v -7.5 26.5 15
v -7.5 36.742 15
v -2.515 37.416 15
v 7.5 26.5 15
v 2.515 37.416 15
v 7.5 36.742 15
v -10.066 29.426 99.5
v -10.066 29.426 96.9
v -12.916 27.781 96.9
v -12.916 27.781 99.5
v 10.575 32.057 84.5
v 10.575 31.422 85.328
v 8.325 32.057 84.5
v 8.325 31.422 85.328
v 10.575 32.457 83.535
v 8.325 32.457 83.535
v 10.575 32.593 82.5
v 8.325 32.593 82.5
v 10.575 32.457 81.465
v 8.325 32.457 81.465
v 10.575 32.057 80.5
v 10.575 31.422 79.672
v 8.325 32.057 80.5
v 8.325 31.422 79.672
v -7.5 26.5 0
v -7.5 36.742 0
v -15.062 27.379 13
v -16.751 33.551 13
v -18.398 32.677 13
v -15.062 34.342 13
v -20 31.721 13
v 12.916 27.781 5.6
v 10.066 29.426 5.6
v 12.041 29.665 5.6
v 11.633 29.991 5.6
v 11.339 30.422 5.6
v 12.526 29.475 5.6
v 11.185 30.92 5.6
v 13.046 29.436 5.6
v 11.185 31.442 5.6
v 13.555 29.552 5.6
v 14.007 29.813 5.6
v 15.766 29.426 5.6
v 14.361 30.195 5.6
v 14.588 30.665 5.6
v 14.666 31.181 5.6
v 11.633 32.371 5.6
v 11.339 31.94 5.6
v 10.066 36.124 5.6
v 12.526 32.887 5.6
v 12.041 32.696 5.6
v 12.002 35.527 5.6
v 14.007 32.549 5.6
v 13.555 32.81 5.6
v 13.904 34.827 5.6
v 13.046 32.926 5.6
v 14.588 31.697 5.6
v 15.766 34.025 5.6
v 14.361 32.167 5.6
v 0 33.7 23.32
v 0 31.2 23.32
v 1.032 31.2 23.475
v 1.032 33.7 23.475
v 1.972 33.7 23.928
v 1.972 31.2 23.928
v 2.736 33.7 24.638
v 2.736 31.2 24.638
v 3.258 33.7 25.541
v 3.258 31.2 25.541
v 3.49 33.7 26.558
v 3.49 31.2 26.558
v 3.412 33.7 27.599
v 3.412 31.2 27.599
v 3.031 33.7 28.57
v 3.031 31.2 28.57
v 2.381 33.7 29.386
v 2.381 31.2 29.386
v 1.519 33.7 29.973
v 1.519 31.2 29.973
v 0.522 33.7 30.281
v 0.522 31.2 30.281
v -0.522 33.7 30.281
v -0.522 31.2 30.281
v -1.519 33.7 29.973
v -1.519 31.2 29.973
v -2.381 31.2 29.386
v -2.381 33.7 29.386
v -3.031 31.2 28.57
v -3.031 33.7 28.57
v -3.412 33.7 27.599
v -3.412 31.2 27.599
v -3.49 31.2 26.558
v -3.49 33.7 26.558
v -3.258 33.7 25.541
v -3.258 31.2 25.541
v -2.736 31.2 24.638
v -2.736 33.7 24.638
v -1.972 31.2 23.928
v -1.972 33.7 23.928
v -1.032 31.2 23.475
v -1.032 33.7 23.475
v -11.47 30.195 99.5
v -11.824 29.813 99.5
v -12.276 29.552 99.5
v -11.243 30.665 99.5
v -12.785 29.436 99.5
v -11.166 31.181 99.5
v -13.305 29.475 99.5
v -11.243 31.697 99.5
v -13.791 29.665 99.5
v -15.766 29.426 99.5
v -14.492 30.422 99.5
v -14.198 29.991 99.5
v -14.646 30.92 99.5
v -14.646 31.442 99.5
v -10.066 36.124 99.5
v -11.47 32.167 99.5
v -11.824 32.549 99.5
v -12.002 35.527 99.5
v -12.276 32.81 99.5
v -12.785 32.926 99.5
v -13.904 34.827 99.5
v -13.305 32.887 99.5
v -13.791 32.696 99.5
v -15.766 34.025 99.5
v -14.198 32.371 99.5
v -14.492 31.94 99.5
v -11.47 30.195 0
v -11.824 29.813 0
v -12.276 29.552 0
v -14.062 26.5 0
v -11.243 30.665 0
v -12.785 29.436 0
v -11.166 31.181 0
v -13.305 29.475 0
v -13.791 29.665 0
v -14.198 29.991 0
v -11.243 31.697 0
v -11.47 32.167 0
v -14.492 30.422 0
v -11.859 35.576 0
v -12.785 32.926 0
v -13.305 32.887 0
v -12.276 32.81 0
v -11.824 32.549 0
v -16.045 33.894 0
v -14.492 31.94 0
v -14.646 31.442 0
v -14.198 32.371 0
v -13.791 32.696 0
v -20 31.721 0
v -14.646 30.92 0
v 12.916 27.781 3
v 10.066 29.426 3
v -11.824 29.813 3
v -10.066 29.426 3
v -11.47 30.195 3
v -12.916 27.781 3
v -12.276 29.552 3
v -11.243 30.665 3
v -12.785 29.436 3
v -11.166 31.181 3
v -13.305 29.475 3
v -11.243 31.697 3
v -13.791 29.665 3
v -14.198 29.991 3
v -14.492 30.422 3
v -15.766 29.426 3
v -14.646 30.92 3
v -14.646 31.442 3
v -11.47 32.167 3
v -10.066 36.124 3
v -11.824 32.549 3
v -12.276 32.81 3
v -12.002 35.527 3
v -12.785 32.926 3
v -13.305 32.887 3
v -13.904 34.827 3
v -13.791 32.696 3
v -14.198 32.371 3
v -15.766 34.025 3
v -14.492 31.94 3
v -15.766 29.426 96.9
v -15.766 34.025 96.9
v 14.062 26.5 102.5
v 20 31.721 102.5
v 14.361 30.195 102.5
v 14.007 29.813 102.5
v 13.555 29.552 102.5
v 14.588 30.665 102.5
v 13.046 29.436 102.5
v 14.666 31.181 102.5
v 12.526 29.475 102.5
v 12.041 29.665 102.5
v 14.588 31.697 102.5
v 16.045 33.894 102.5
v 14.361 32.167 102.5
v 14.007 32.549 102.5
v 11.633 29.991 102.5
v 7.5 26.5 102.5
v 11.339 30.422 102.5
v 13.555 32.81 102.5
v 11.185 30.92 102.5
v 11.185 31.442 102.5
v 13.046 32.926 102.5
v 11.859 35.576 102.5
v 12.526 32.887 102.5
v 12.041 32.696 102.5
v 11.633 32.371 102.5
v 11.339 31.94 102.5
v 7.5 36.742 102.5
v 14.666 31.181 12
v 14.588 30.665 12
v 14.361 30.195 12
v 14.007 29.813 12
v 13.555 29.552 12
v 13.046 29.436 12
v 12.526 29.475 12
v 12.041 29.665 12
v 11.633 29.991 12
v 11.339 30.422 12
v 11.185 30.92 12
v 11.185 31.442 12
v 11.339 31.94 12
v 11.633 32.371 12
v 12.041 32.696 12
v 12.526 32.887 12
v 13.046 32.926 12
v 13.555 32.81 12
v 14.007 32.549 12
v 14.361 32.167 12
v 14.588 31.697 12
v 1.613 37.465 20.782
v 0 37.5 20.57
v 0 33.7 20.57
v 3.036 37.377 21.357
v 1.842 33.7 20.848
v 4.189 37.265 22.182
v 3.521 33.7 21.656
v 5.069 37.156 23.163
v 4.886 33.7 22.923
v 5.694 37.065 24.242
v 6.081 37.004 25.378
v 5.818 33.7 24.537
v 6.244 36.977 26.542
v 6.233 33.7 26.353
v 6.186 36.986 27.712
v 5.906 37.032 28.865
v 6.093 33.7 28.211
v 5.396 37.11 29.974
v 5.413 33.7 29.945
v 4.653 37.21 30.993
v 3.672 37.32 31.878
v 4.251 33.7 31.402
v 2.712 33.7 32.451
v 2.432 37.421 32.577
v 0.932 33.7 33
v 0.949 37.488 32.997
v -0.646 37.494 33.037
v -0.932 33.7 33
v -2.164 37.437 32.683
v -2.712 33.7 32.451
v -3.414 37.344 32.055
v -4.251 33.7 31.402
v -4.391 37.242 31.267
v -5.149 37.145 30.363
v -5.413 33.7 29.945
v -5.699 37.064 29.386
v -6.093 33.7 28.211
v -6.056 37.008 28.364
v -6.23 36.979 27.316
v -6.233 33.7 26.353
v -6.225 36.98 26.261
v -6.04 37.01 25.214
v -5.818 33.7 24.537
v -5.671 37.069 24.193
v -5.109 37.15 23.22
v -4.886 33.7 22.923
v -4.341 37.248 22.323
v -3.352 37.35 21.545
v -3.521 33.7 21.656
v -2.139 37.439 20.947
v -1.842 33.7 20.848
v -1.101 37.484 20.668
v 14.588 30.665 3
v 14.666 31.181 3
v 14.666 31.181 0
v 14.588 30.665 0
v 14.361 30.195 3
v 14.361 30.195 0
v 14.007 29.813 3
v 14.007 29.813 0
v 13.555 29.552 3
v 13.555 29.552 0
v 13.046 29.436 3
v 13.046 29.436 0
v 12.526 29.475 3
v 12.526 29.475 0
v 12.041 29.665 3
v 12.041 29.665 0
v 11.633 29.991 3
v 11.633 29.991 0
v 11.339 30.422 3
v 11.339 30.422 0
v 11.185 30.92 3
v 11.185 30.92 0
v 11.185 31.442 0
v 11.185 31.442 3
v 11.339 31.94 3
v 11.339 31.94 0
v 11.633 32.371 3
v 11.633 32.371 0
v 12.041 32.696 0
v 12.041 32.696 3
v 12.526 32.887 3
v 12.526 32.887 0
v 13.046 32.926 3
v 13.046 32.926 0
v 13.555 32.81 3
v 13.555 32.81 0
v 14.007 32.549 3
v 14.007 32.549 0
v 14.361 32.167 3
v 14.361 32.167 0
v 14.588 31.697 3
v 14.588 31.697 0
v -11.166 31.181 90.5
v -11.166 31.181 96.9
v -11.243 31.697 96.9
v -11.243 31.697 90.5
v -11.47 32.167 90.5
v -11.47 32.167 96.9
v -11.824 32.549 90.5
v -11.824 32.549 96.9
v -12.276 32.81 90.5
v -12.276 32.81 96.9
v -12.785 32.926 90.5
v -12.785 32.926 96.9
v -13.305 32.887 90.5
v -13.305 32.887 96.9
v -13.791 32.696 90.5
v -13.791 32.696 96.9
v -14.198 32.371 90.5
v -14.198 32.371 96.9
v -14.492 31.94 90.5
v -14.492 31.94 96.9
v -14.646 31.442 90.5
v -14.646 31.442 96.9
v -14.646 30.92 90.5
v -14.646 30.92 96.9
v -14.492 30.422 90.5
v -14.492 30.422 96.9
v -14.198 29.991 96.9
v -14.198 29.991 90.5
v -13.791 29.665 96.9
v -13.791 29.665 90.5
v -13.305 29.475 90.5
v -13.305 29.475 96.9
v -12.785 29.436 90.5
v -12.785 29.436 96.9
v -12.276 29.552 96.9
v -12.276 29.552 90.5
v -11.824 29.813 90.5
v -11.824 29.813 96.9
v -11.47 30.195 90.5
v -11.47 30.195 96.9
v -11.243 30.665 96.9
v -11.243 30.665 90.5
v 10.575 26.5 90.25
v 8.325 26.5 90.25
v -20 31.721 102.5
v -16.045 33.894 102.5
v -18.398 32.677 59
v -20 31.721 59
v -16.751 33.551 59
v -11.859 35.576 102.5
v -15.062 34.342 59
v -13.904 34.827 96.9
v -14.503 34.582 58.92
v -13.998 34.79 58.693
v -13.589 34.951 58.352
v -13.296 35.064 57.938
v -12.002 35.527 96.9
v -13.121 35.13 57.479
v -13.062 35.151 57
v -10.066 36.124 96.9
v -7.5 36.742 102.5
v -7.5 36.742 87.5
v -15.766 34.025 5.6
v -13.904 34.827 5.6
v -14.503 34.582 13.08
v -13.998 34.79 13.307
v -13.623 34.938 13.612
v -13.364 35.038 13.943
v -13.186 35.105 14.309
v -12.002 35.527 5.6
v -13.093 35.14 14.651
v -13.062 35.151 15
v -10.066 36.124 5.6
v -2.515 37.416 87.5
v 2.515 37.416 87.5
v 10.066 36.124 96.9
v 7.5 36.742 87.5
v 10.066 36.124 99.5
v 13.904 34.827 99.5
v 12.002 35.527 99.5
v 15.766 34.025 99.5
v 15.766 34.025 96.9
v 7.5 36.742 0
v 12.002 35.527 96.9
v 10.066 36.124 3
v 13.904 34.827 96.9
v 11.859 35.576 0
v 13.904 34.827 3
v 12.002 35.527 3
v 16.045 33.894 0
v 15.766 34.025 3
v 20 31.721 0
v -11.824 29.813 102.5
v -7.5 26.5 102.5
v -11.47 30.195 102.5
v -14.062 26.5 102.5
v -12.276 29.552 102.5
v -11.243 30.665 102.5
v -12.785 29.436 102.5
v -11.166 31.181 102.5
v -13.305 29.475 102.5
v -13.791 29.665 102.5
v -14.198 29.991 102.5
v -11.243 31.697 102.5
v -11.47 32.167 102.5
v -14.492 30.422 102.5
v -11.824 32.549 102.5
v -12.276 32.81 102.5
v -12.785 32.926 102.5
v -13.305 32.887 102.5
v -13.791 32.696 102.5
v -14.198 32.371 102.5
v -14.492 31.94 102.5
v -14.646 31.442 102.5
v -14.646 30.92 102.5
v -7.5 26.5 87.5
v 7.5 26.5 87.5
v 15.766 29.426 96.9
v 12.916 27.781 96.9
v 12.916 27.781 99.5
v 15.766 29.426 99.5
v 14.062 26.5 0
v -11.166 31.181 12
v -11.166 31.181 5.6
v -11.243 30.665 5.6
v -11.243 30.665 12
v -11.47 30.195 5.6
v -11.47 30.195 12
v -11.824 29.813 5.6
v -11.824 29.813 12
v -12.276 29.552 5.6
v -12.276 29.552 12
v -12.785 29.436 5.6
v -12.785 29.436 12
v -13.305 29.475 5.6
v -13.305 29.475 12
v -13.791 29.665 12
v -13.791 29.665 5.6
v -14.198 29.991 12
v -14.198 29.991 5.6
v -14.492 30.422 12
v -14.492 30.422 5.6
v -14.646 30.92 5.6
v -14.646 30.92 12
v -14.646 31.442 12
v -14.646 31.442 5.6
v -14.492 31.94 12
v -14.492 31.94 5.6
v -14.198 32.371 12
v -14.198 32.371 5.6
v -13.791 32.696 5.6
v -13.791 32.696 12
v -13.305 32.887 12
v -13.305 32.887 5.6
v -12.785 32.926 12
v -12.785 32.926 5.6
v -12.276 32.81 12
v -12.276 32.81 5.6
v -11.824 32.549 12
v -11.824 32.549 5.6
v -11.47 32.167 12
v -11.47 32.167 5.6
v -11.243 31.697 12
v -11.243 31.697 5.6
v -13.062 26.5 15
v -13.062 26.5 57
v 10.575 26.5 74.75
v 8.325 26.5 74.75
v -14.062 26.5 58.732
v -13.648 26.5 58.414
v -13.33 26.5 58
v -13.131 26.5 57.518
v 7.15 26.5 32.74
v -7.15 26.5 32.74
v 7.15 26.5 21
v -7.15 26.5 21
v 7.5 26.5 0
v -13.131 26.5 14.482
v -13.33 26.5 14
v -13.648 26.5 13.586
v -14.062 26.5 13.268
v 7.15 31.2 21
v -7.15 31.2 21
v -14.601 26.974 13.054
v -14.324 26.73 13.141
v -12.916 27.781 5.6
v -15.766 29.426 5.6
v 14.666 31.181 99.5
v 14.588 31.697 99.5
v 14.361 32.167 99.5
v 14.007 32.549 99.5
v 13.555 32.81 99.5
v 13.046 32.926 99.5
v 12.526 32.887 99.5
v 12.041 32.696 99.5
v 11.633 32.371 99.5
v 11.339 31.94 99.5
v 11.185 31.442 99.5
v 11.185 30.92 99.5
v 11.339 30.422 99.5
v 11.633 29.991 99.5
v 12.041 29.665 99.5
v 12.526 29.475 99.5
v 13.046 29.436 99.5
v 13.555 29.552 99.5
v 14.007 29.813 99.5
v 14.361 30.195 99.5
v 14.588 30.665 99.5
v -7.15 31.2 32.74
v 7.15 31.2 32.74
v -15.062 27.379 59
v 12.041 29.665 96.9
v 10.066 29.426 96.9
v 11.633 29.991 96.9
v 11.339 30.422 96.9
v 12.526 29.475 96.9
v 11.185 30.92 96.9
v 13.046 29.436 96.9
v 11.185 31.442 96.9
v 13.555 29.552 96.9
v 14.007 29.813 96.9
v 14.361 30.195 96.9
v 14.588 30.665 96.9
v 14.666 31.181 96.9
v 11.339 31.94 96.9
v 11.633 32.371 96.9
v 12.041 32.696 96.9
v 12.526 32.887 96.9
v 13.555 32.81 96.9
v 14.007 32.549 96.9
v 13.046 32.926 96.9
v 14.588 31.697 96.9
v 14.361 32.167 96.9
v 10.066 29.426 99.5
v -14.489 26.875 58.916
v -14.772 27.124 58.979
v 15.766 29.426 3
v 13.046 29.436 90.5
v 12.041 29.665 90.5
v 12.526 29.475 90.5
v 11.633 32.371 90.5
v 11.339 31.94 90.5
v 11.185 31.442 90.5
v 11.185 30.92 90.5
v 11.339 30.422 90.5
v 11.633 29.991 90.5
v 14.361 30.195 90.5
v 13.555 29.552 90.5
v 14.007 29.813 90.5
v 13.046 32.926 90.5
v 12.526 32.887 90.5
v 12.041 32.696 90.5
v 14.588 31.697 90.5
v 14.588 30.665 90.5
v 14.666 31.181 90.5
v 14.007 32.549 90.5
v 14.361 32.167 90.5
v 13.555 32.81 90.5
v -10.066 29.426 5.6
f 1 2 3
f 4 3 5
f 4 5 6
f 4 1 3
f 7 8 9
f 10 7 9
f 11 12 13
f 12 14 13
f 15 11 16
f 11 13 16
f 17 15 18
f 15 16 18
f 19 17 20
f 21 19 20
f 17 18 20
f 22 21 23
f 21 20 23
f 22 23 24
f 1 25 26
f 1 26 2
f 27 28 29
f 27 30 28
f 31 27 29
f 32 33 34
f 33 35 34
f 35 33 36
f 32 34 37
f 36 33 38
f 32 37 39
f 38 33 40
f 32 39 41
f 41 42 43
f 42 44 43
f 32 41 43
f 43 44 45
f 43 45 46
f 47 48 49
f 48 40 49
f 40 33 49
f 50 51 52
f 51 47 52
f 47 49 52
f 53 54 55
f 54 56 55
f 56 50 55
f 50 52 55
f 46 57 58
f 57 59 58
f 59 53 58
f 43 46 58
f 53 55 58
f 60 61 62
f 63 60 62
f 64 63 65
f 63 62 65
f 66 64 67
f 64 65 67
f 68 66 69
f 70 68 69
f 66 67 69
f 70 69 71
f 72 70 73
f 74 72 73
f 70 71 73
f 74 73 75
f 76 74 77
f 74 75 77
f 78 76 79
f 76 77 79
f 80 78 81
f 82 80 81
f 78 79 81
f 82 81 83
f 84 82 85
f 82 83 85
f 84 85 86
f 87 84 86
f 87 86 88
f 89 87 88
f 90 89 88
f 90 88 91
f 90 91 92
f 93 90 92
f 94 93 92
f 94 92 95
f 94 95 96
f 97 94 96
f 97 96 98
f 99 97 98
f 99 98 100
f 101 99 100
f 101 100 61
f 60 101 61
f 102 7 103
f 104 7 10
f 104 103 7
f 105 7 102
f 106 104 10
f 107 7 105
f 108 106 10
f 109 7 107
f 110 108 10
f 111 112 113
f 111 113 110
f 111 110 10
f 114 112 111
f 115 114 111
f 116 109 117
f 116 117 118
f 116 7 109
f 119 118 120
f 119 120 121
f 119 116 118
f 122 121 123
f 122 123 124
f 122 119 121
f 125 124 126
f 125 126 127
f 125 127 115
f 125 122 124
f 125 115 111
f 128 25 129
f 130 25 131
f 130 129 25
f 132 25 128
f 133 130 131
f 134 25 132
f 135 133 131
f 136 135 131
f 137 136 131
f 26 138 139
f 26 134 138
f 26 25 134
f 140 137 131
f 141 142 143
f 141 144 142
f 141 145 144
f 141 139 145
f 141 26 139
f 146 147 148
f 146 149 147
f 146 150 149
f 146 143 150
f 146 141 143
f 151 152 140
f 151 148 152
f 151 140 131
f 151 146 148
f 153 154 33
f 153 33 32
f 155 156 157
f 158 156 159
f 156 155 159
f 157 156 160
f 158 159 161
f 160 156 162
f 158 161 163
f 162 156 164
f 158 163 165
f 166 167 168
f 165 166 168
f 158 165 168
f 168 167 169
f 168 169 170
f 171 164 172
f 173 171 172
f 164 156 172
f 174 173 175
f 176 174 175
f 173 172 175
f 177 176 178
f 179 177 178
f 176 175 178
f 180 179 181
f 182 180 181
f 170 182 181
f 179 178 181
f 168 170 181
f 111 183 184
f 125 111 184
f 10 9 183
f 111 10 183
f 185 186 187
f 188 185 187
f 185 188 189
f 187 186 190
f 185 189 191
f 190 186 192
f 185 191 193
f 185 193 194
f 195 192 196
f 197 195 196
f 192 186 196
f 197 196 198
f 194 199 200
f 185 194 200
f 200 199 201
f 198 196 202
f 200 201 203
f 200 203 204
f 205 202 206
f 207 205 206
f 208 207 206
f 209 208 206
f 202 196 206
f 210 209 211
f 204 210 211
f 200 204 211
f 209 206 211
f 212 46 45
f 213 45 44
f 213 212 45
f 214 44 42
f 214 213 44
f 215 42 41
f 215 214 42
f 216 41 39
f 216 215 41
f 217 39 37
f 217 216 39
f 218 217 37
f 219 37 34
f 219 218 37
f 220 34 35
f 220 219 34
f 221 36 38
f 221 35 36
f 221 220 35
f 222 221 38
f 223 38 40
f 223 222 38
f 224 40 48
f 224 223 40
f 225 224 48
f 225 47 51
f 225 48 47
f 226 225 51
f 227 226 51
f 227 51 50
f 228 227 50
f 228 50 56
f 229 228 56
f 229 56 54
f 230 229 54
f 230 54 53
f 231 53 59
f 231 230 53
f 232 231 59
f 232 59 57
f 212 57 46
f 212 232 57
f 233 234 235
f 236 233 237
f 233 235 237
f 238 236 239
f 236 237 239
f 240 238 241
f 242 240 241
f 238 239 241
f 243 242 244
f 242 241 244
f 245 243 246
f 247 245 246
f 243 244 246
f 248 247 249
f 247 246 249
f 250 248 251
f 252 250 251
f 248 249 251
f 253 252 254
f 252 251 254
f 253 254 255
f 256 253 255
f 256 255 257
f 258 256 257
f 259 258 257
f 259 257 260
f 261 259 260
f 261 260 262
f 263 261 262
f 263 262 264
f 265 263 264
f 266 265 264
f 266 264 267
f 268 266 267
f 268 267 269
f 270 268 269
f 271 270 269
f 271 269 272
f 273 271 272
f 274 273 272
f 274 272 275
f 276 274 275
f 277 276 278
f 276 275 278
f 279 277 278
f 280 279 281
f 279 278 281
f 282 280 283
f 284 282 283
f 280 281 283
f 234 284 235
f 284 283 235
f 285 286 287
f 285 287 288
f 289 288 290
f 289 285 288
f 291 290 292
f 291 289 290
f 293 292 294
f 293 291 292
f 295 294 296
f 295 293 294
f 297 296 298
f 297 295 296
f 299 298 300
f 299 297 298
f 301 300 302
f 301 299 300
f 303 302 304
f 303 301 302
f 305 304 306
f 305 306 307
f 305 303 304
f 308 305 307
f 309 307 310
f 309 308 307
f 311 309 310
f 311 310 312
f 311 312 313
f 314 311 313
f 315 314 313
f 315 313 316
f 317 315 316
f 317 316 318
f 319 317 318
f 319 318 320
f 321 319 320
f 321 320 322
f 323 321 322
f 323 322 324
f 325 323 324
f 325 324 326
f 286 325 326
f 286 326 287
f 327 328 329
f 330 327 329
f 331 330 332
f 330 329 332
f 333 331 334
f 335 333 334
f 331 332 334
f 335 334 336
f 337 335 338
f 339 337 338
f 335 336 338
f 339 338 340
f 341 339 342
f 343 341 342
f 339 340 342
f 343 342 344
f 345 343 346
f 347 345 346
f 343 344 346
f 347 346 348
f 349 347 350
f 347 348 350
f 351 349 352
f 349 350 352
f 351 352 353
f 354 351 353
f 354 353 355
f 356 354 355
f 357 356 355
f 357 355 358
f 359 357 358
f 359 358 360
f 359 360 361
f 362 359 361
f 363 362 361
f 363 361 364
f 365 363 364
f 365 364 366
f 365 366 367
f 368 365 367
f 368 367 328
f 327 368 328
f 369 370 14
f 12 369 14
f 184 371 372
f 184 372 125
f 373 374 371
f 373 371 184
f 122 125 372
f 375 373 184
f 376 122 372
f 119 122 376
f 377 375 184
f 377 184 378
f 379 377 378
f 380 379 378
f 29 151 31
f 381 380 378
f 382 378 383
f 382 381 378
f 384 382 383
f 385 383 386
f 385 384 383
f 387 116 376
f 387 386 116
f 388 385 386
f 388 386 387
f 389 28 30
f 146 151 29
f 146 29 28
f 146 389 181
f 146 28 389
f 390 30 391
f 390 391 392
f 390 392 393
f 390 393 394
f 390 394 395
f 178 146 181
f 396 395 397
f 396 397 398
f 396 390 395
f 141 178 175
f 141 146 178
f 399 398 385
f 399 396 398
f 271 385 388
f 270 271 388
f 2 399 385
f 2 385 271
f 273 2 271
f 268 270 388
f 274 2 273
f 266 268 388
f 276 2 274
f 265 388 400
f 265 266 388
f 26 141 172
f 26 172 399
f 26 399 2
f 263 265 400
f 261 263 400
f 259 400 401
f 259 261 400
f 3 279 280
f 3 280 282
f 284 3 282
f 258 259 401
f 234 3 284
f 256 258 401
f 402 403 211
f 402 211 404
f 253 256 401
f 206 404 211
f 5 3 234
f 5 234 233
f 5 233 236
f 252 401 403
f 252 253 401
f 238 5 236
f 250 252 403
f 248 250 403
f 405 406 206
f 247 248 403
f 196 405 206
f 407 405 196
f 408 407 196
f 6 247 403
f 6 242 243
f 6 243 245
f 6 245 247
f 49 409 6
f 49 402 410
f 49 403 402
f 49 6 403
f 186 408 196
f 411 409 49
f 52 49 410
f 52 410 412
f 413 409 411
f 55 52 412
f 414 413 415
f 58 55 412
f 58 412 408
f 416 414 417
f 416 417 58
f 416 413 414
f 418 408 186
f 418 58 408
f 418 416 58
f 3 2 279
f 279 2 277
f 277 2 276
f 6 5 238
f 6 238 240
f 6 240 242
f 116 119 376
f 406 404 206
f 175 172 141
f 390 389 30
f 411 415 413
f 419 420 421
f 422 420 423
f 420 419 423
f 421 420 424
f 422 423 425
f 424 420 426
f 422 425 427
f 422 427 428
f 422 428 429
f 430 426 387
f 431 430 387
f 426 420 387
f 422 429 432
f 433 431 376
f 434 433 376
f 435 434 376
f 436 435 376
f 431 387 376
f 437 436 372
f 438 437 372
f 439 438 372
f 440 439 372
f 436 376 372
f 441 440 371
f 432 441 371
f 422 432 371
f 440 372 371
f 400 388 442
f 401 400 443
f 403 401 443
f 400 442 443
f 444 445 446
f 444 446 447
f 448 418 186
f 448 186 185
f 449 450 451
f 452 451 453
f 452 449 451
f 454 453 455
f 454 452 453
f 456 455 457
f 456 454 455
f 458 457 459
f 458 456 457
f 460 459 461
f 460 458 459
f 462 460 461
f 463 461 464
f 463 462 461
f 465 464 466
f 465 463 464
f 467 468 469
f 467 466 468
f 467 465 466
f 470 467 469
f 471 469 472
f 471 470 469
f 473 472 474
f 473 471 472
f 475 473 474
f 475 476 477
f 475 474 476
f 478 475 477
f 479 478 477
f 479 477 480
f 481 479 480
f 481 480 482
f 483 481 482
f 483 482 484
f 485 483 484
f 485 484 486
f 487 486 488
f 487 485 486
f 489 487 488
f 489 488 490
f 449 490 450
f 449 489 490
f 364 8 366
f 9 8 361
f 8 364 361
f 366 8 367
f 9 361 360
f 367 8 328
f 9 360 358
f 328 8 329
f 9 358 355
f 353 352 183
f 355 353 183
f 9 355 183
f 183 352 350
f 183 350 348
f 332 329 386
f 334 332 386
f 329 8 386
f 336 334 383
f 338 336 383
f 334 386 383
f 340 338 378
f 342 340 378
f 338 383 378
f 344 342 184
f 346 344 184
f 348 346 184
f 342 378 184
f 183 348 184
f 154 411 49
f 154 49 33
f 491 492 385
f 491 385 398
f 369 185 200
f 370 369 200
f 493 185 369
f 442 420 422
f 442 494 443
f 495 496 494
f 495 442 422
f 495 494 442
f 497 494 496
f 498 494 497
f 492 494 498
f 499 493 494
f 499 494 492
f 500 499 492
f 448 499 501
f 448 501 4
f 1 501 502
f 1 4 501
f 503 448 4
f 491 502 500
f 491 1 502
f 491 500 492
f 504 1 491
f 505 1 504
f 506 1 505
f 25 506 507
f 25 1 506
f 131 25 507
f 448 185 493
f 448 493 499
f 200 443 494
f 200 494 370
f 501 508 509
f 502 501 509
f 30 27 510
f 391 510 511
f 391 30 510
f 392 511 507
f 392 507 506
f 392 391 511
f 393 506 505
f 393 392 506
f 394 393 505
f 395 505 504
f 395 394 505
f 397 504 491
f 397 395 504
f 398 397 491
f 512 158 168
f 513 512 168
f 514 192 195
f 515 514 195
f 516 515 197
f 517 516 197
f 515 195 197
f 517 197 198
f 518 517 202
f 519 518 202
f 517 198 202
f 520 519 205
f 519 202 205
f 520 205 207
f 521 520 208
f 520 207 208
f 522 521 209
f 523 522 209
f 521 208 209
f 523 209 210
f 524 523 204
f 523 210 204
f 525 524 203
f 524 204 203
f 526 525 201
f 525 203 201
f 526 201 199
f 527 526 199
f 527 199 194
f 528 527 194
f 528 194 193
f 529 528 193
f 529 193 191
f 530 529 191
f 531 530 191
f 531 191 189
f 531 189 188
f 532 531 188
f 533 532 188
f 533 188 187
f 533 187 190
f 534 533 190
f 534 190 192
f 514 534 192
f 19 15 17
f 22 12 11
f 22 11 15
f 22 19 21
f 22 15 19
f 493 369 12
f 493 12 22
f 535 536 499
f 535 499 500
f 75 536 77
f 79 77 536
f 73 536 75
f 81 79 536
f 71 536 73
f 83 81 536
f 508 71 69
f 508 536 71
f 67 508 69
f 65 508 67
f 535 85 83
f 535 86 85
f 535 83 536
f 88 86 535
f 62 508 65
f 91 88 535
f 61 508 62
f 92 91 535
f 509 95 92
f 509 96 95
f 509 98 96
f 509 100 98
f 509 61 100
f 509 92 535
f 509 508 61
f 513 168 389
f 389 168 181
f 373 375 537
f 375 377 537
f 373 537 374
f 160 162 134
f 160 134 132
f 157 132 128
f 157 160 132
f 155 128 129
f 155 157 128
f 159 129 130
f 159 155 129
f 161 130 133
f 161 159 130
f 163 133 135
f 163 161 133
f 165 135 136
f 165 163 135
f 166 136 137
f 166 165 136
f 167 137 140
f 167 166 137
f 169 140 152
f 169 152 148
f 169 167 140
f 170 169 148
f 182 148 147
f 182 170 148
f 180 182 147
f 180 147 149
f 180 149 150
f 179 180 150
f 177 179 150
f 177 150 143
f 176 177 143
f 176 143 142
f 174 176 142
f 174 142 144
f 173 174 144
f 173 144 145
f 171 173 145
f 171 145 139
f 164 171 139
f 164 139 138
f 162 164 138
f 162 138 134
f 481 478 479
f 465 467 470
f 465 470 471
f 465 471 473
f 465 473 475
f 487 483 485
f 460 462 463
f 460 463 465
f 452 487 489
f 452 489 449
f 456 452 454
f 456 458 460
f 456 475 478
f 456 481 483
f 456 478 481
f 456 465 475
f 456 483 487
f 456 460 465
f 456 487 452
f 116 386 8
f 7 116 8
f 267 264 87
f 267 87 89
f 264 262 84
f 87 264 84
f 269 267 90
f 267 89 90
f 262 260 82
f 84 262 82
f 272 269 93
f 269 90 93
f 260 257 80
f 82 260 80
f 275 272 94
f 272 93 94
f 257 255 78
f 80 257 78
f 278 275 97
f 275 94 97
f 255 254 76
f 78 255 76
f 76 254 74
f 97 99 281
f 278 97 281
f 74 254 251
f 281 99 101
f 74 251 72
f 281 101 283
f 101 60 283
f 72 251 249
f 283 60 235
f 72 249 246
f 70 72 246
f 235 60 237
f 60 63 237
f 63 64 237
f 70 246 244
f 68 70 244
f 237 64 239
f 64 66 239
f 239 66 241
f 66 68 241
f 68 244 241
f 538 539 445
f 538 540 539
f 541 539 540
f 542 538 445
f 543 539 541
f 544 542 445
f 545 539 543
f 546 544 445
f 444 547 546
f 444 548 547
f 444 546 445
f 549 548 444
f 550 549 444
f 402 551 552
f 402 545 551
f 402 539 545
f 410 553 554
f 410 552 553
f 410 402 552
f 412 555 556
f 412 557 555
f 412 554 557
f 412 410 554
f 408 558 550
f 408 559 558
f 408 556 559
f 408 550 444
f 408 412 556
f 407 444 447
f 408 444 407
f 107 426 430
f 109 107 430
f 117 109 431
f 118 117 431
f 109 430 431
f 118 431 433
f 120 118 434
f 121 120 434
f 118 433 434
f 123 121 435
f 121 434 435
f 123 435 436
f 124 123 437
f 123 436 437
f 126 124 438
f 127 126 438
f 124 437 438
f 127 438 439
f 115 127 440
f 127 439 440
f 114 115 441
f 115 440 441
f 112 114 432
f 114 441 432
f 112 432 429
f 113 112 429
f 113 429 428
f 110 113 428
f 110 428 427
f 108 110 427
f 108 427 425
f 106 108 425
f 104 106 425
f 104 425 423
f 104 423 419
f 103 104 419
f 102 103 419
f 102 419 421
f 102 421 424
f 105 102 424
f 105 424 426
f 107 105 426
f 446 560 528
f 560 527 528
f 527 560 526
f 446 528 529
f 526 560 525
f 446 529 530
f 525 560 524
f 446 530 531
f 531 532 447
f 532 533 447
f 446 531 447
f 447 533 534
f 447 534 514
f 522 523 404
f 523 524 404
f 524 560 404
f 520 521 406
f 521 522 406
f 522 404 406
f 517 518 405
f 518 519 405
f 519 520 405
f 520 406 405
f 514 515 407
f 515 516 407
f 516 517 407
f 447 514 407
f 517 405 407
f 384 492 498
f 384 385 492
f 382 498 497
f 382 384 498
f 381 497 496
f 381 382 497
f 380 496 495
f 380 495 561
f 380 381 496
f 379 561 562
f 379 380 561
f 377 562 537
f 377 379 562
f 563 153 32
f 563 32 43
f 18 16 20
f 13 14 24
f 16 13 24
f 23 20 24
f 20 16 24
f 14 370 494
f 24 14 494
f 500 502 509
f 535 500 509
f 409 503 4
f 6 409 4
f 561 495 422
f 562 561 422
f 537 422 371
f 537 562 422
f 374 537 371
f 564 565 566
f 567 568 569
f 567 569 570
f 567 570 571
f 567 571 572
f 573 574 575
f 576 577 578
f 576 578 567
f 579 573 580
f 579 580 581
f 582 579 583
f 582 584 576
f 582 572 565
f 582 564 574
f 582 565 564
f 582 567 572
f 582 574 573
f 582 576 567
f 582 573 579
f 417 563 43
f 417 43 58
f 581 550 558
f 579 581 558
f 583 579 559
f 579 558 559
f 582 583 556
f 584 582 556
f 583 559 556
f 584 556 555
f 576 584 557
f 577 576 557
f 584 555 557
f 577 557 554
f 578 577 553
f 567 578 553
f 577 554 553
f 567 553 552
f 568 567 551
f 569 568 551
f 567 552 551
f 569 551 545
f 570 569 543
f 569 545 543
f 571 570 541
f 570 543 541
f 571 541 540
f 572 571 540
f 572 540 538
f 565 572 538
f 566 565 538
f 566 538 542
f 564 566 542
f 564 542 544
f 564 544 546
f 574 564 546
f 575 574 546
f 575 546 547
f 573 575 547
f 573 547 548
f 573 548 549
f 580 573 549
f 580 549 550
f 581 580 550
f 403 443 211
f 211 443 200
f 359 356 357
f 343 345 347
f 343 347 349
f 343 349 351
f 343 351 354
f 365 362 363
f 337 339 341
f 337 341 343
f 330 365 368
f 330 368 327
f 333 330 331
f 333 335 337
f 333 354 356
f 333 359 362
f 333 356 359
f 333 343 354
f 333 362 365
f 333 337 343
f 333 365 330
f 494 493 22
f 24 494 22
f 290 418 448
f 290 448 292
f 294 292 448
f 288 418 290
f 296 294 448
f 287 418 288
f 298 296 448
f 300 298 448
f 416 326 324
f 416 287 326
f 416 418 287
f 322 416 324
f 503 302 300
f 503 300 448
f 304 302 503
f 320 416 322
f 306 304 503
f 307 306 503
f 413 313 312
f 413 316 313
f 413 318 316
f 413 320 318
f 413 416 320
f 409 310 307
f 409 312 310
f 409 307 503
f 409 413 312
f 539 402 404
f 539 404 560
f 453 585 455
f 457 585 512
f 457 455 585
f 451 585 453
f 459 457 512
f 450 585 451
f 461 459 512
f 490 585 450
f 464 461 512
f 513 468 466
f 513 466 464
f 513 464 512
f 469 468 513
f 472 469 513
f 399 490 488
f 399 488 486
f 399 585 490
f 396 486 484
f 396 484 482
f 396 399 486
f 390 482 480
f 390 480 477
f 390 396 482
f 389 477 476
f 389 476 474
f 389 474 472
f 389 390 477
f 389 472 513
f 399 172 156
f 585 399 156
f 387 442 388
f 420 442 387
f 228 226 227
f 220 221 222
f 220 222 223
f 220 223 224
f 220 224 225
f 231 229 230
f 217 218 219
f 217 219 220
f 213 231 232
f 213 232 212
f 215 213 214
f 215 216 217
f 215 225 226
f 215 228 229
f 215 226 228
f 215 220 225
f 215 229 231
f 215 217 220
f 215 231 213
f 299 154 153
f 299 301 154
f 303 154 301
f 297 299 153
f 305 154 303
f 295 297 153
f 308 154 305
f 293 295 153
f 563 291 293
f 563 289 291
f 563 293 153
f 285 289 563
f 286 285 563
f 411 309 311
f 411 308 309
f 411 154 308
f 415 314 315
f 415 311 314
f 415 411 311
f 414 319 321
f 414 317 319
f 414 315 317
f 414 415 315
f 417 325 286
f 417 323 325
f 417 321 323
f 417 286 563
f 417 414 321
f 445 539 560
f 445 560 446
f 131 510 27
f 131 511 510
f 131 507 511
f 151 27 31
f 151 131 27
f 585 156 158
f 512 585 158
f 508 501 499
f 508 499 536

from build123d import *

# Parameters (mm, degrees)
BOSS_EXTRU_2_DEPTH       = 102.5
ESQUISSE7_R              = 1.75
ENL_V_MAT_EXTRU_4_DEPTH  = 12
ENL_V_START              = -5.6
ENL_V_MAT_EXTRU_5_DEPTH  = 2.6
ENL_V_START_2            = -12
ESQUISSE12_R             = 1.75
ENL_V_MAT_EXTRU_6_DEPTH  = 12
ENL_V_START_3            = -3
ENL_V_MAT_EXTRU_7_DEPTH  = 2.6
ENL_V_START_4            = -21
ESQUISSE18_W             = 14.3
ESQUISSE18_H             = 4.7
ENL_V_MAT_EXTRU_11_DEPTH = 11.74
ESQUISSE19_R             = 3.5
ENL_V_MAT_EXTRU_12_DEPTH = 105.622846453
ENL_V_START_5            = -2.5
ESQUISSE20_R             = 6.25
ENL_V_MAT_EXTRU_13_DEPTH = 103.122846576
ESQUISSE21_W             = 15
ESQUISSE21_H             = 15
ENL_V_MAT_EXTRU_14_DEPTH = 106.010713866
ESQUISSE22_W             = 2.25
ESQUISSE22_H             = 15.5
ENL_V_MAT_EXTRU_15_DEPTH = 9.125
CHANFREIN1_SIZE          = 9.125
CONG_1_R                 = 4
ESQUISSE23_W             = 6.93763889
ESQUISSE23_H             = 46
ENL_V_MAT_EXTRU_16_DEPTH = 106.010713866
CONG_2_R                 = 2


with BuildPart() as part:
    # Esquisse3 → Boss.-Extru.2 (new body)
    with BuildSketch(Plane.XY):
        with BuildLine():
            ThreePointArc((-20, 31.721443851), (0, 37.5), (20, 31.721443851))
            Line((20, 31.721443851), (14.06236111, 26.5))
            Line((14.06236111, 26.5), (-14.06236111, 26.5))
            Line((-14.06236111, 26.5), (-20, 31.721443851))
        make_face()
    extrude(amount=BOSS_EXTRU_2_DEPTH)

    # Esquisse7 → Enlèv. mat.-Extru.4 (cut)
    with BuildSketch(Plane.XY.offset(102.5)):
        with Locations((-12.915565842, 31.180934222)):
            Circle(ESQUISSE7_R)
        with Locations((12.915565842, 31.180934222)):
            Circle(ESQUISSE7_R)
    extrude(amount=-ENL_V_MAT_EXTRU_4_DEPTH, mode=Mode.SUBTRACT)

    # Esquisse11 → Enlèv. mat.-Extru.5 (cut)
    with BuildSketch(Plane.XY.offset(102.5).offset(ENL_V_START)):
        with BuildLine():
            Line((-15.765565842, 31.180934222), (-15.765565842, 34.024945756))
            ThreePointArc((-15.765565842, 34.024945756), (-12.95813326, 35.190009696), (-10.065565842, 36.123875543))
            Line((-10.065565842, 36.123875543), (-10.065565842, 29.426382489))
            Line((-10.065565842, 29.426382489), (-12.915565842, 27.780934222))
            Line((-12.915565842, 27.780934222), (-15.765565842, 29.426382489))
            Line((-15.765565842, 29.426382489), (-15.765565842, 31.180934222))
        make_face()
        with BuildLine():
            Line((10.065565842, 36.123875543), (10.065565842, 29.426382489))
            Line((10.065565842, 29.426382489), (12.915565842, 27.780934222))
            Line((12.915565842, 27.780934222), (15.765565842, 29.426382489))
            Line((15.765565842, 29.426382489), (15.765565842, 34.024945756))
            ThreePointArc((15.765565842, 34.024945756), (12.95813326, 35.190009696), (10.065565842, 36.123875543))
        make_face()
    extrude(amount=ENL_V_MAT_EXTRU_5_DEPTH, mode=Mode.SUBTRACT)

    # Esquisse12 → Enlèv. mat.-Extru.6 (cut)
    with BuildSketch(Plane(origin=(0, 0, 0), x_dir=(-1, 0, 0), z_dir=(0, 0, -1)).offset(ENL_V_START_2)):
        with Locations(Location((-12.915565842, 31.180934222, 0), (0, 0, 180))):
            Circle(ESQUISSE12_R)
        with Locations(Location((12.915565842, 31.180934222, 0), (0, 0, 180))):
            Circle(ESQUISSE12_R)
    extrude(amount=ENL_V_MAT_EXTRU_6_DEPTH, mode=Mode.SUBTRACT)

    # Esquisse14 → Enlèv. mat.-Extru.7 (cut)
    with BuildSketch(Plane(origin=(0, 0, 0), x_dir=(-1, 0, 0), z_dir=(0, 0, -1)).offset(ENL_V_START_3)):
        with BuildLine():
            Line((-15.765565842, 31.180934222), (-15.765565842, 34.024945756))
            ThreePointArc((-15.765565842, 34.024945756), (-12.95813326, 35.190009696), (-10.065565842, 36.123875543))
            Line((-10.065565842, 36.123875543), (-10.065565842, 29.426382489))
            Line((-10.065565842, 29.426382489), (-12.915565842, 27.780934222))
            Line((-12.915565842, 27.780934222), (-15.765565842, 29.426382489))
            Line((-15.765565842, 29.426382489), (-15.765565842, 31.180934222))
        make_face()
        with BuildLine():
            Line((10.065565842, 36.123875543), (10.065565842, 29.426382489))
            Line((10.065565842, 29.426382489), (12.915565842, 27.780934222))
            Line((12.915565842, 27.780934222), (15.765565842, 29.426382489))
            Line((15.765565842, 29.426382489), (15.765565842, 34.024945756))
            ThreePointArc((15.765565842, 34.024945756), (12.95813326, 35.190009696), (10.065565842, 36.123875543))
        make_face()
    extrude(amount=-ENL_V_MAT_EXTRU_7_DEPTH, mode=Mode.SUBTRACT)

    # Esquisse18 → Enlèv. mat.-Extru.11 (cut)
    with BuildSketch(Plane(origin=(0, 0, 0), x_dir=(-1, 0, 0), z_dir=(0, 0, -1)).offset(ENL_V_START_4)):
        with Locations((0, 28.85)):
            Rectangle(ESQUISSE18_W, ESQUISSE18_H)
    extrude(amount=-ENL_V_MAT_EXTRU_11_DEPTH, mode=Mode.SUBTRACT)

    # Esquisse19 → Enlèv. mat.-Extru.12 (cut, through all)
    with BuildSketch(Plane(origin=(0, 31.2, 0), x_dir=(-1, 0, 0), z_dir=(0, -1, 0))):
        with Locations(Location((0, -26.82, 0), (0, 0, 90))):
            Circle(ESQUISSE19_R)
    extrude(amount=-ENL_V_MAT_EXTRU_12_DEPTH, mode=Mode.SUBTRACT)

    # Esquisse20 → Enlèv. mat.-Extru.13 (cut, through all)
    with BuildSketch(Plane(origin=(0, 31.2, 0), x_dir=(-1, 0, 0), z_dir=(0, -1, 0)).offset(ENL_V_START_5)):
        with Locations(Location((0, -26.82, 0), (0, 0, 90))):
            Circle(ESQUISSE20_R)
    extrude(amount=-ENL_V_MAT_EXTRU_13_DEPTH, mode=Mode.SUBTRACT)

    # Esquisse21 → Enlèv. mat.-Extru.14 (cut, through all)
    with BuildSketch(Plane.XZ.offset(-26.5)):
        with Locations((0, 95)):
            Rectangle(ESQUISSE21_W, ESQUISSE21_H)
        with Locations((0, 7.5)):
            Rectangle(ESQUISSE21_W, ESQUISSE21_H)
    extrude(amount=-ENL_V_MAT_EXTRU_14_DEPTH, mode=Mode.SUBTRACT)

    # Esquisse22 → Enlèv. mat.-Extru.15 (cut)
    with BuildSketch(Plane(origin=(0, 26.5, 0), x_dir=(-1, 0, 0), z_dir=(0, -1, 0))):
        with Locations((-9.45, -82.5)):
            Rectangle(ESQUISSE22_W, ESQUISSE22_H)
    extrude(amount=-ENL_V_MAT_EXTRU_15_DEPTH, mode=Mode.SUBTRACT)

    # Chanfrein1
    # the kernel refuses this chamfer: 9.125 mm, written as the material it adds along each edge
    with BuildSketch(Plane(origin=(8.325, 35.625, 90.25), x_dir=(0, -0.9996219169112966, 0.027495876610586712), z_dir=(1, 0, 0)), Plane(origin=(10.575, 35.625, 74.75), x_dir=(0, -0.9996219169112966, -0.027495876610586712), z_dir=(-1, 0, 0))) as chanfrein1_piece_1:
        Polygon((CHANFREIN1_SIZE * 0.999621916911, CHANFREIN1_SIZE * 0.0274958766106), (-CHANFREIN1_SIZE * 0.0274958766106, CHANFREIN1_SIZE * 0.999621916911), (0, 0), align=None)
    extrude(amount=2.25)

    # Congé1
    cong_1_edges = [part.edges().sort_by_distance(p)[0] for p in [
        (9.45, 34.25, 82.5),
    ]]
    fillet(cong_1_edges, radius=CONG_1_R)

    # Esquisse23 → Enlèv. mat.-Extru.16 (cut, through all)
    with BuildSketch(Plane(origin=(0, 26.5, 0), x_dir=(-1, 0, 0), z_dir=(0, -1, 0))):
        with Locations((16.531180555, -36)):
            Rectangle(ESQUISSE23_W, ESQUISSE23_H)
    extrude(amount=-ENL_V_MAT_EXTRU_16_DEPTH, mode=Mode.SUBTRACT)

    # Congé2
    cong_2_edges = [part.edges().sort_by_distance(p)[0] for p in [
        (-13.06236111, 30.825727028, 59),
        (-13.06236111, 30.825727028, 13),
    ]]
    fillet(cong_2_edges, radius=CONG_2_R)


solid = part.part
